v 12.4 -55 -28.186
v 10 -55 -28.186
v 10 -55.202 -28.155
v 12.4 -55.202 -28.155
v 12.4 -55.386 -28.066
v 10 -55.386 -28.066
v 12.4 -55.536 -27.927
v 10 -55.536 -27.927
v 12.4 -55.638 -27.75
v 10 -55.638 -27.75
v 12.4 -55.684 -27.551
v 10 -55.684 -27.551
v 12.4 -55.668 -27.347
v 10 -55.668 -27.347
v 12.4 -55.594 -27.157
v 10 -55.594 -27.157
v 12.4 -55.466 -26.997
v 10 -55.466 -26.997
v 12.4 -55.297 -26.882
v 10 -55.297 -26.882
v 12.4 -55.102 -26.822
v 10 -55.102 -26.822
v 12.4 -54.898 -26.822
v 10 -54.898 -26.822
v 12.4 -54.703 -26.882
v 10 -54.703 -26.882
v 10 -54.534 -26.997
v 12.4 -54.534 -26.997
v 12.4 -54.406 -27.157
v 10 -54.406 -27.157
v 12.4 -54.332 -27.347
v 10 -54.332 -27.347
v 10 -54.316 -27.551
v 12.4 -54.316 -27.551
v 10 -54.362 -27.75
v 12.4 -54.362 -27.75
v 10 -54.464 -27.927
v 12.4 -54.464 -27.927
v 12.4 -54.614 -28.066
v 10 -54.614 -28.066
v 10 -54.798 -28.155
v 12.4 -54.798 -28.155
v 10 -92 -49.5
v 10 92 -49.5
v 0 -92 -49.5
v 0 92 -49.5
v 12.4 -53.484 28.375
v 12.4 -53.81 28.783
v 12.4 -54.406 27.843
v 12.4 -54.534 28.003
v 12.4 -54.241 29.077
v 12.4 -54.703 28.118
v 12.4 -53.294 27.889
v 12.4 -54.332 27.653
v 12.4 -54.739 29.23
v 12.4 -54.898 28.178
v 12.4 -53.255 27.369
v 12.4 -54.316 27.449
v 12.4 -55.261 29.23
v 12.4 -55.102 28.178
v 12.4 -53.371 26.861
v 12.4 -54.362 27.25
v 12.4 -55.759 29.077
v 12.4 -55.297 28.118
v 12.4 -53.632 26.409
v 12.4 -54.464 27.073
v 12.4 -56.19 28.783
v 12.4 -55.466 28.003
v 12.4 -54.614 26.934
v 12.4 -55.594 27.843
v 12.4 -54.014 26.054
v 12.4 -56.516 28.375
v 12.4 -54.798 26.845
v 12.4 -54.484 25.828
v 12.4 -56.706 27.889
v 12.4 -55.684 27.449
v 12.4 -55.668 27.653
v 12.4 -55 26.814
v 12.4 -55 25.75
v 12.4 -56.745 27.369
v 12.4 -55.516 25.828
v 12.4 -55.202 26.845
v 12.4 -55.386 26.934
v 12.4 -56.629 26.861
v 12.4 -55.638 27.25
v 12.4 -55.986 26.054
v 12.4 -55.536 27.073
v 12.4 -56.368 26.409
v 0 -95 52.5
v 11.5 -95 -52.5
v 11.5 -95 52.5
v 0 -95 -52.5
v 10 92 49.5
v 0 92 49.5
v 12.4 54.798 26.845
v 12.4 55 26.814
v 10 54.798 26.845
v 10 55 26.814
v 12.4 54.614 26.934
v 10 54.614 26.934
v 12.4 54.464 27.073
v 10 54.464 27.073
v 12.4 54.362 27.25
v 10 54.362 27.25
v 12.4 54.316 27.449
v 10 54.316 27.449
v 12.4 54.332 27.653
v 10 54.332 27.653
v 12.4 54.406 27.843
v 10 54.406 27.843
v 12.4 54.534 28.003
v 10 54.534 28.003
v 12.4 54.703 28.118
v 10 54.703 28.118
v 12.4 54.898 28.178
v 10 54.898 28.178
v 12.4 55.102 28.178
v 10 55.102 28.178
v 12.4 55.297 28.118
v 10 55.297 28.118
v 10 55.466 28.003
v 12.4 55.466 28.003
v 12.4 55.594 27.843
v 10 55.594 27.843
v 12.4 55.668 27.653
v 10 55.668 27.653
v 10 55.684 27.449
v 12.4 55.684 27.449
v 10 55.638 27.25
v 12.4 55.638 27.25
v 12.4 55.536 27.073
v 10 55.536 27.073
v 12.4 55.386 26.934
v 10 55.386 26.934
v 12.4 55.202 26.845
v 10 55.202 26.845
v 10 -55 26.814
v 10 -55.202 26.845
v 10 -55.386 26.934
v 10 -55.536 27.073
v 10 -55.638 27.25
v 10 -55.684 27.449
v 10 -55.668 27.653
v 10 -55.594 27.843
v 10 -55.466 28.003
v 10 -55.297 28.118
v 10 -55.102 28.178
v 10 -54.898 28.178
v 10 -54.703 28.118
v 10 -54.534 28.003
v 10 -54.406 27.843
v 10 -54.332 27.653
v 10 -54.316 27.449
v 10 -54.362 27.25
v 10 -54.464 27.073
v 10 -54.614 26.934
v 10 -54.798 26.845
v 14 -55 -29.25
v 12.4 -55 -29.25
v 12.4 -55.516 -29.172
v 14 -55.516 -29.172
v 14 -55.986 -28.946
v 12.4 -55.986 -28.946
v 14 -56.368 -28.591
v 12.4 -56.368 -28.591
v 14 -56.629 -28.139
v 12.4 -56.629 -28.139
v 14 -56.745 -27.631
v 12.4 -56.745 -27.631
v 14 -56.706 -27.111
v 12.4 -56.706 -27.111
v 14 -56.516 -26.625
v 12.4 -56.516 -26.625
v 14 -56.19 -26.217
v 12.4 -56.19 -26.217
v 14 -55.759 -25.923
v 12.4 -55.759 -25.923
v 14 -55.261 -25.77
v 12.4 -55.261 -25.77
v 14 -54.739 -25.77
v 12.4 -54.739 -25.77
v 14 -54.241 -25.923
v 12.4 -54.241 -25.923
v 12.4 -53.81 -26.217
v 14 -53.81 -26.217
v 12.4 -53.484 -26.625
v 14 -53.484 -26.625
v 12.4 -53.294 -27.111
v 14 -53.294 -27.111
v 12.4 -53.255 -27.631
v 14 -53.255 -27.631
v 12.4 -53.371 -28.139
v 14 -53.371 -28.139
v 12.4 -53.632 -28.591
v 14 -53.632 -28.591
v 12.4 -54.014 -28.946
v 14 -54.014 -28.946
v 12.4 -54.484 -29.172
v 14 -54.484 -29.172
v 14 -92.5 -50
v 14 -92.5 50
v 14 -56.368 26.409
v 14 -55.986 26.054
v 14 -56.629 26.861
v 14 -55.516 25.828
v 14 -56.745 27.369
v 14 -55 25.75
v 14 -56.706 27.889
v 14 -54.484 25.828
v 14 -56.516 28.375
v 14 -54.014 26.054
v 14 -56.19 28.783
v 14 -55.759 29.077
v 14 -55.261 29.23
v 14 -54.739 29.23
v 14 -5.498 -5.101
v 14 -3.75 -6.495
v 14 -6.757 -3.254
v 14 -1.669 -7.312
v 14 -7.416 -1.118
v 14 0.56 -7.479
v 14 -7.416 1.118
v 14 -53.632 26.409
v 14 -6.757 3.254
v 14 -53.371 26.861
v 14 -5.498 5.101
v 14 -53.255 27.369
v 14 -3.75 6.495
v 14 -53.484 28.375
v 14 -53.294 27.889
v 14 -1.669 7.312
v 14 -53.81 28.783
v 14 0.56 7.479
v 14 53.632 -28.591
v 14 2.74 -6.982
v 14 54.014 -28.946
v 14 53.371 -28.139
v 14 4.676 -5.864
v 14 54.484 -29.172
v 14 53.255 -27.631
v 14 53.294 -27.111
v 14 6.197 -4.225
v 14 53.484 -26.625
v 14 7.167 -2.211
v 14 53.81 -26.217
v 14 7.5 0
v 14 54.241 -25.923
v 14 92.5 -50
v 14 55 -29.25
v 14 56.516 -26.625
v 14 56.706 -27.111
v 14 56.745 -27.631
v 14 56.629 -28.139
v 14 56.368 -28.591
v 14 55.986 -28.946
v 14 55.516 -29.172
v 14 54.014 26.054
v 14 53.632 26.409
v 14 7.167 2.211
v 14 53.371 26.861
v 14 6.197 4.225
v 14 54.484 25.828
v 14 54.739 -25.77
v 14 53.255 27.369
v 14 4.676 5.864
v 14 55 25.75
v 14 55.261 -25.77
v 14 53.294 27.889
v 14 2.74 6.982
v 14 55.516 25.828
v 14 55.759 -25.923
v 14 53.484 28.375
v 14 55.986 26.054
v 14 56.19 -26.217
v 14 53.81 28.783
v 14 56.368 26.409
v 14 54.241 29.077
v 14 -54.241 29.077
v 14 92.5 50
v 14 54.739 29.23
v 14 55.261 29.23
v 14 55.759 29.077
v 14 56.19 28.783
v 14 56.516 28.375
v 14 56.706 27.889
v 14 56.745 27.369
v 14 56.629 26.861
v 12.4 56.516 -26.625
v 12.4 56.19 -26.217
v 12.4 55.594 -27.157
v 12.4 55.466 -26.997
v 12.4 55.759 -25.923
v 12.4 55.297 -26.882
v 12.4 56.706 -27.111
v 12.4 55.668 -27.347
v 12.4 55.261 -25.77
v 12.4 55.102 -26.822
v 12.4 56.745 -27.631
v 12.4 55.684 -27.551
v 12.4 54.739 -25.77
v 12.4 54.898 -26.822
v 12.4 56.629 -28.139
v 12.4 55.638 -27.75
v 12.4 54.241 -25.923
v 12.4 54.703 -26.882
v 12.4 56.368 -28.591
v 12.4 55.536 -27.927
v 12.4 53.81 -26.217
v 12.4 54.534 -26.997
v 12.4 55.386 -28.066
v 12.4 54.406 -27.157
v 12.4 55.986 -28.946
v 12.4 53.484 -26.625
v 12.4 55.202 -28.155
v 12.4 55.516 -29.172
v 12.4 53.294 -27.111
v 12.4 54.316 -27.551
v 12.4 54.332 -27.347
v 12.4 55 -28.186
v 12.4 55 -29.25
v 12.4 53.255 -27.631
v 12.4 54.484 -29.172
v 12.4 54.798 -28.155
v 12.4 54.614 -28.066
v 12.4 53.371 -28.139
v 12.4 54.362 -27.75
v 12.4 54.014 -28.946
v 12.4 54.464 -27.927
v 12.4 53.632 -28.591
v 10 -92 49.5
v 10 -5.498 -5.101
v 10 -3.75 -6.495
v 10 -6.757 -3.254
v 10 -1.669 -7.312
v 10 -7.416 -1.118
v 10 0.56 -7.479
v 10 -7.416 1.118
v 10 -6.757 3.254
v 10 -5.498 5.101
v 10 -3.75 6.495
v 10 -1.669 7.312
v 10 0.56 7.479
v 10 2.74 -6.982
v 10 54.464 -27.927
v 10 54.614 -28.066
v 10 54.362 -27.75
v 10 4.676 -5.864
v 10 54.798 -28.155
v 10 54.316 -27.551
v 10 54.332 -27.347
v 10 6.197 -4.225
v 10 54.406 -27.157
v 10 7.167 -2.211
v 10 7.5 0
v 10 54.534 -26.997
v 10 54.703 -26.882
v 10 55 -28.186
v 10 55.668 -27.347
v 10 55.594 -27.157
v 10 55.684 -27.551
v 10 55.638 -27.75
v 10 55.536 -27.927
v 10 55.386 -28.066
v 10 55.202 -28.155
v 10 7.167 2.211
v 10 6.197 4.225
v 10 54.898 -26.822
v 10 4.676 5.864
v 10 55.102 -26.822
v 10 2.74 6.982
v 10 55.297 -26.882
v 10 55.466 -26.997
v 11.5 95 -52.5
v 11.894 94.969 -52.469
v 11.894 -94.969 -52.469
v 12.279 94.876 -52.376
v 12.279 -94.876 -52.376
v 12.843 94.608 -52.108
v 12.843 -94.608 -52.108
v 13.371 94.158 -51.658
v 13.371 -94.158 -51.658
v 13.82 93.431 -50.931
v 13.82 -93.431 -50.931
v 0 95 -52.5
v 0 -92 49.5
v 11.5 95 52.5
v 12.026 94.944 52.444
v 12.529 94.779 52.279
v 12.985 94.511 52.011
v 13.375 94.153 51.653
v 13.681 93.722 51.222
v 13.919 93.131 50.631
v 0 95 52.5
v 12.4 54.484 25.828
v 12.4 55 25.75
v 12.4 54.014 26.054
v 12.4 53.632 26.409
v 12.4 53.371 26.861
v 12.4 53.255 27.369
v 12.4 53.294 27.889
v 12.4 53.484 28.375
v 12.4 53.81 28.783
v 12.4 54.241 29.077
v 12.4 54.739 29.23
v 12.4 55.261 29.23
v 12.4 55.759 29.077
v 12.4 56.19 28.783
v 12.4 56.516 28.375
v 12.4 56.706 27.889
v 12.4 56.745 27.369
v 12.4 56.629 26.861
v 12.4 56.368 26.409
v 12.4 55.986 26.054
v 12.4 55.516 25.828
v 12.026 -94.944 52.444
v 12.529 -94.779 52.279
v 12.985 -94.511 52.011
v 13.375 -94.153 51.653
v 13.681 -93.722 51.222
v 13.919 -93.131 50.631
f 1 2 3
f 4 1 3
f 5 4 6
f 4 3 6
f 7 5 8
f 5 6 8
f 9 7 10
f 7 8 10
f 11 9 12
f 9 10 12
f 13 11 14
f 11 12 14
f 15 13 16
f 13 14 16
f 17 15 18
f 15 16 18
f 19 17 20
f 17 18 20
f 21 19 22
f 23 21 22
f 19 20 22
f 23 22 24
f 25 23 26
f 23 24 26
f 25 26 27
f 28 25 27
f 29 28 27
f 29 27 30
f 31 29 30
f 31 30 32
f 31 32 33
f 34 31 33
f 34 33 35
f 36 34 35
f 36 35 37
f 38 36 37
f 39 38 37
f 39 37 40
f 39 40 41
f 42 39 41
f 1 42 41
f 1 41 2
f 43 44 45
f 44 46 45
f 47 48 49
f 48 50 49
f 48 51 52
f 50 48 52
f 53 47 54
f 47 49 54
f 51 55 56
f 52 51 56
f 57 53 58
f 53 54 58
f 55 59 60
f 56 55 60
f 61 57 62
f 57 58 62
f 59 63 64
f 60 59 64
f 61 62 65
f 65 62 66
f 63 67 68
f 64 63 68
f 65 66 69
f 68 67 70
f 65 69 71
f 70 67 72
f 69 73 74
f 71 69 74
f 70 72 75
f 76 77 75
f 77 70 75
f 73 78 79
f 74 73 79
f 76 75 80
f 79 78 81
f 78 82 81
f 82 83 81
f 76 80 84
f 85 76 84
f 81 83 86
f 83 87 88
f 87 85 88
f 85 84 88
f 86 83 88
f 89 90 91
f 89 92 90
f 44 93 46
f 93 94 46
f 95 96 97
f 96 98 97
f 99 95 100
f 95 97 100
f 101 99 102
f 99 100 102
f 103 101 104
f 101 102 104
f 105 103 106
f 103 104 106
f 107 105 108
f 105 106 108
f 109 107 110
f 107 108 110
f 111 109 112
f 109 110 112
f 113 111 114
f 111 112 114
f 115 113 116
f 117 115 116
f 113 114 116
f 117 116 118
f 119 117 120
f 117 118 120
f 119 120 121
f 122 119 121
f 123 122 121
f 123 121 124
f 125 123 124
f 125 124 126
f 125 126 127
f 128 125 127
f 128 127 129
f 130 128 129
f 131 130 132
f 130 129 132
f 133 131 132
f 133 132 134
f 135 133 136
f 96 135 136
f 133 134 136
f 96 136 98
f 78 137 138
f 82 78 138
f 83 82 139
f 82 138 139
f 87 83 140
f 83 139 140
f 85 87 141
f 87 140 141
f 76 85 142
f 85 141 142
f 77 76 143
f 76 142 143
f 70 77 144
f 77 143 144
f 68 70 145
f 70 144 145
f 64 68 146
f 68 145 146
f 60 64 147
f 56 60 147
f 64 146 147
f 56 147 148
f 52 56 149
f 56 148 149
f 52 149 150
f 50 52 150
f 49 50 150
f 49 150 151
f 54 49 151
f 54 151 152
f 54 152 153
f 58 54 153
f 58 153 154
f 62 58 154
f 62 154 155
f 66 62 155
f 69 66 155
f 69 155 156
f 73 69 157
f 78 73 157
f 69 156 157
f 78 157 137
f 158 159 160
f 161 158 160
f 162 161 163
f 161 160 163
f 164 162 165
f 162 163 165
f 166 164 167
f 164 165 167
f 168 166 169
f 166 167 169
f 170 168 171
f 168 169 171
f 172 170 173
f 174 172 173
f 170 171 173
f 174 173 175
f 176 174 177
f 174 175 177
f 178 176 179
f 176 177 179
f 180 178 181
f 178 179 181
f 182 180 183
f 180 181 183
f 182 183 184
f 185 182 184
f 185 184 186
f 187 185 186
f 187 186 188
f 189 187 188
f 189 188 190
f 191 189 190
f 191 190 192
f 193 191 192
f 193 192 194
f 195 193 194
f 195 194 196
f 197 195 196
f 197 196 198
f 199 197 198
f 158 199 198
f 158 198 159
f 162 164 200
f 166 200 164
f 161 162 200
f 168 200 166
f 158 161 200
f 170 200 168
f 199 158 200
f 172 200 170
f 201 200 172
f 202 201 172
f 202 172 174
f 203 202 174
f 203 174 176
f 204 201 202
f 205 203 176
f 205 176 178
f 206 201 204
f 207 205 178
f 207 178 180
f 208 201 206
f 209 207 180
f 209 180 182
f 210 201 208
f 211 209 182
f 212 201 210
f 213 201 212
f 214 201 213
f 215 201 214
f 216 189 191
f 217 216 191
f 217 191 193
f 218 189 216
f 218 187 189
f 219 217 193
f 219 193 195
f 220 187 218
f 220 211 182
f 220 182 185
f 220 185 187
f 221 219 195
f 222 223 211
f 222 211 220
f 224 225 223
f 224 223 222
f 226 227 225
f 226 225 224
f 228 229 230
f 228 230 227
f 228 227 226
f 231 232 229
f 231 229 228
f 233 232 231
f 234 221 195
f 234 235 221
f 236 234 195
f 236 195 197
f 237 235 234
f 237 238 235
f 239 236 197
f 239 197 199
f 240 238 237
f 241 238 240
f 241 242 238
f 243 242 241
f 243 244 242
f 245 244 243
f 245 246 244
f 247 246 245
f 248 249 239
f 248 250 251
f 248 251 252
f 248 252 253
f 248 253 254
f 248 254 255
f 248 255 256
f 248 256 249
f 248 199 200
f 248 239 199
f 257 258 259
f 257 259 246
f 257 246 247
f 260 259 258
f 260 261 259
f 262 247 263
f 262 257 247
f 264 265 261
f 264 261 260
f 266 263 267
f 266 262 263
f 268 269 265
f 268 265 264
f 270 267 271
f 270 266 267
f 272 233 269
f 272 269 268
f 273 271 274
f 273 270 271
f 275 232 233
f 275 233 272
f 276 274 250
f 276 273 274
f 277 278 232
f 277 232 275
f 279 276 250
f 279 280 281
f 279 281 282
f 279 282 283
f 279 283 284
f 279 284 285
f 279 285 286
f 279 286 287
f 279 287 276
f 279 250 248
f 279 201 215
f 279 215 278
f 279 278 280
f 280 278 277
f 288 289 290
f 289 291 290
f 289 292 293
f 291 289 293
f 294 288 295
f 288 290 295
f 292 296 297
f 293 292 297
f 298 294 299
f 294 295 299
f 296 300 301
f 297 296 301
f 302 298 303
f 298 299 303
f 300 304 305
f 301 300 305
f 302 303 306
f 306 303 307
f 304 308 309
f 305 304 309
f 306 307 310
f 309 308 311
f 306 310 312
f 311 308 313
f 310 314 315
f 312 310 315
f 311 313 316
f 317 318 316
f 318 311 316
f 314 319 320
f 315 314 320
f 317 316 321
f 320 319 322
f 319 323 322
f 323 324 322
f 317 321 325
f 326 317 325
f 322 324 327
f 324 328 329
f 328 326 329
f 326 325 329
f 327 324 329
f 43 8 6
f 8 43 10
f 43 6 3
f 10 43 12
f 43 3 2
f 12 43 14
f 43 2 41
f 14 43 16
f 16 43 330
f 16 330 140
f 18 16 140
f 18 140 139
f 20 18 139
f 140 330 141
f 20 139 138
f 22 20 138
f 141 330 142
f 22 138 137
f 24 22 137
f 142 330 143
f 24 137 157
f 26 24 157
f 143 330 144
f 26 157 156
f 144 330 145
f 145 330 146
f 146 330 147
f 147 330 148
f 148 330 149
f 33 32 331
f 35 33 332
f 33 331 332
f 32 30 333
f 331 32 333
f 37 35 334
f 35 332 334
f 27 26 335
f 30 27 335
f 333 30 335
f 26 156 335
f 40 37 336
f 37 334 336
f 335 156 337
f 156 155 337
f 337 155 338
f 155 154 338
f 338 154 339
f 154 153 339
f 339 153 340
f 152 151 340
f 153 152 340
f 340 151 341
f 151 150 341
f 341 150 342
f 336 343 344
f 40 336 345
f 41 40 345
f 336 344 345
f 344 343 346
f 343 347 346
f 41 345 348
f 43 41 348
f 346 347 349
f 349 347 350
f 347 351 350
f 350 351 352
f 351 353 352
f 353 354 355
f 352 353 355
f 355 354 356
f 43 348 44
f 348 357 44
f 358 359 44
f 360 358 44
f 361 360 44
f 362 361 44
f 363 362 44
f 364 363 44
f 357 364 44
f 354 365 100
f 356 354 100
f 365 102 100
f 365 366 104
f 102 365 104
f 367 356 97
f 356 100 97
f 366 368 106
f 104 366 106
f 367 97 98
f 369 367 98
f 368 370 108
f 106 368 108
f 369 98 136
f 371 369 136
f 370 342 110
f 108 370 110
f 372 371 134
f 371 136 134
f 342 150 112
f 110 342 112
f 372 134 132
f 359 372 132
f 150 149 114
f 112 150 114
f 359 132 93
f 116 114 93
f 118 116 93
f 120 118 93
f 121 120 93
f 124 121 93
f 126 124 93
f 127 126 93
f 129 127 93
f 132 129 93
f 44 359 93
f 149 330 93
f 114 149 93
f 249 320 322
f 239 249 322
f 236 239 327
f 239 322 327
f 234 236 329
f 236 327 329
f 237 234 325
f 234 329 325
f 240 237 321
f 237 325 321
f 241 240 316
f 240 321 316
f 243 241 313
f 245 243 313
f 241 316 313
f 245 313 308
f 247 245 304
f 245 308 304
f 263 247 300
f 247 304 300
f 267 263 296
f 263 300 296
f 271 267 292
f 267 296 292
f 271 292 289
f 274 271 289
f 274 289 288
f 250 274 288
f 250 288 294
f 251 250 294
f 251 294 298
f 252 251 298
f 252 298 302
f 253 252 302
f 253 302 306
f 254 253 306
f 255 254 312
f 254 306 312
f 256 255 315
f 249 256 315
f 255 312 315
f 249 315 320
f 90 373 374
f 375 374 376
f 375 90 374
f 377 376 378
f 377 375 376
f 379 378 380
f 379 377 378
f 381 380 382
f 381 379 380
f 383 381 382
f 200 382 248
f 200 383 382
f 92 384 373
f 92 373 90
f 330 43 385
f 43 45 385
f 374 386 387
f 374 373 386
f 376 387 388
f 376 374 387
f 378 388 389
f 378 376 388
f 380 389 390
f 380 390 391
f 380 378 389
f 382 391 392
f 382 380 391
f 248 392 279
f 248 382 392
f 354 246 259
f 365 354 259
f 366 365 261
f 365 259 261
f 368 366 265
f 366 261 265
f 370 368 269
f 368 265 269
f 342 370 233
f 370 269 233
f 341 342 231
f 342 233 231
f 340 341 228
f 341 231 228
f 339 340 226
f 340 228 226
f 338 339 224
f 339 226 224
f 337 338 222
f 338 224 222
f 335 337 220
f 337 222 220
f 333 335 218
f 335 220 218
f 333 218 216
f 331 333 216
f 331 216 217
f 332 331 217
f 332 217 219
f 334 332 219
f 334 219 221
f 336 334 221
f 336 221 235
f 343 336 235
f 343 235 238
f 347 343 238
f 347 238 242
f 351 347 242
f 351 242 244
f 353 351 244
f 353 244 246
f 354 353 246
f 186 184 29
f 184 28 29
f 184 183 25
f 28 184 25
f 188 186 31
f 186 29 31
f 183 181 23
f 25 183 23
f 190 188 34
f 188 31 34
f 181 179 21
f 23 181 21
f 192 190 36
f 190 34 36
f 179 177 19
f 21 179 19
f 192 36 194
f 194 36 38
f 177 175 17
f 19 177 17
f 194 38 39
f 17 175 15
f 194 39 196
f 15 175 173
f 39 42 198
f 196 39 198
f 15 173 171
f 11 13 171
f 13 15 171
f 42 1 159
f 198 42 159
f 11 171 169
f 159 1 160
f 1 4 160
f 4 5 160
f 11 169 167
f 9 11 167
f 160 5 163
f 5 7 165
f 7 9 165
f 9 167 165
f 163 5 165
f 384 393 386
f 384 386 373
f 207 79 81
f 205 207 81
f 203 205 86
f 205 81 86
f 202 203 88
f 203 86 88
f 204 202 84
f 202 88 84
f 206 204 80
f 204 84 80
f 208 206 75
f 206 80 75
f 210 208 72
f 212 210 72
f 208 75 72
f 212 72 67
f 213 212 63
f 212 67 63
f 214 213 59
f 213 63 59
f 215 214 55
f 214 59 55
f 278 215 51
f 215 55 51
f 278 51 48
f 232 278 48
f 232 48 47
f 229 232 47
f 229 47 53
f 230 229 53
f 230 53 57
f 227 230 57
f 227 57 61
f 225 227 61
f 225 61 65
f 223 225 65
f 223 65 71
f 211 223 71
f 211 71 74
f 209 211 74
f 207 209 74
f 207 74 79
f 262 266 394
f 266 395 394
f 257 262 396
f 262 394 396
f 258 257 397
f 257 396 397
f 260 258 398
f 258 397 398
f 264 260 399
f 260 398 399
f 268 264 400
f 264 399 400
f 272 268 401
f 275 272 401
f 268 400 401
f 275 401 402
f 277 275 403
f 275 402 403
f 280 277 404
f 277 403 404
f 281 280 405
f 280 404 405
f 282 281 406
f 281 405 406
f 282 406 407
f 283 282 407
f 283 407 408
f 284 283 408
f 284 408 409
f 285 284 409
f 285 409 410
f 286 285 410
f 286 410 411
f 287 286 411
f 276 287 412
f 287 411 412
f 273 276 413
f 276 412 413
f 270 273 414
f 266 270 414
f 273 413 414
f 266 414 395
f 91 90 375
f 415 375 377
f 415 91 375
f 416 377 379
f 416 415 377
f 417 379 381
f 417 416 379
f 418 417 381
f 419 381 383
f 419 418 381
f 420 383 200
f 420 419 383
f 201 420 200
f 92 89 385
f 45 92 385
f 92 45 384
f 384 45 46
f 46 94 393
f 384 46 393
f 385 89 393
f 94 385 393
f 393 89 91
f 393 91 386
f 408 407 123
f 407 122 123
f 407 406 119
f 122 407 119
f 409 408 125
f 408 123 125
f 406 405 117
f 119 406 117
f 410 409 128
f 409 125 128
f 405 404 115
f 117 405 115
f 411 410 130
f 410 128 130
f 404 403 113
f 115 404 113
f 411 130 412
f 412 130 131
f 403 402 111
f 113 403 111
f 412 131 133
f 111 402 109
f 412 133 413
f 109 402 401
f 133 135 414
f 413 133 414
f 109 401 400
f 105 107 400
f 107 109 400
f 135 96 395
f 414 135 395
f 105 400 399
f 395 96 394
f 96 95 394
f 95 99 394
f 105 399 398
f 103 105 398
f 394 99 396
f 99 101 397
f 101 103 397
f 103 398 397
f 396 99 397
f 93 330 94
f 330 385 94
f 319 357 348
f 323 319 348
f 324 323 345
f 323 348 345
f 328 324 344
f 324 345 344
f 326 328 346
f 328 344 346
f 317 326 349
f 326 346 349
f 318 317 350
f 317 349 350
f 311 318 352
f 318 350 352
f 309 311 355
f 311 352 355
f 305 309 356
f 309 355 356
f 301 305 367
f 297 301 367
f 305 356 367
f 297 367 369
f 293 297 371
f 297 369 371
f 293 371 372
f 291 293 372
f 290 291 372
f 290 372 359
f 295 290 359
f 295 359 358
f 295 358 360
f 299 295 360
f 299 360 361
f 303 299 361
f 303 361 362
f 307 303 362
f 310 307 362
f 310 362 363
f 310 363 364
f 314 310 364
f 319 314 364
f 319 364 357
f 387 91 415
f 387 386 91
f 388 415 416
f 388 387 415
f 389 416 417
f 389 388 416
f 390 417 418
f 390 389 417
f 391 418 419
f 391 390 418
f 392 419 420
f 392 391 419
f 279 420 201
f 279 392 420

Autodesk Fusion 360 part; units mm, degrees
sketch "Sketch1" plane through (0, 0, 0) normal (1, 0, 0) x (0, 1, 0)
  line L0 (-95, 52.5) -> (95, 52.5)
  line L1 (95, 52.5) -> (95, -52.5)
  line L2 (95, -52.5) -> (-95, -52.5)
  line L3 (-95, -52.5) -> (-95, 52.5)
  line L4 (95, 52.5) -> (-95, -52.5) construction
  line L5 (-95, 52.5) -> (95, -52.5) construction
  line L6 (92, -49.5) -> (-92, -49.5)
  line L7 (-92, -49.5) -> (-92, 49.5)
  line L8 (-92, 49.5) -> (92, 49.5)
  line L9 (92, 49.5) -> (92, -49.5)
  dimension "d1" = 190
  dimension "d2" = 105
  dimension "d5" = 3
extrude "Extrude1" add sketch "Sketch1" along normal blind 14 contours L0 L1 L2 L3 | L6 L7 L8 L9
extrude "Extrude2" cut sketch "Sketch1" along normal blind 10 contours L6 L7 L8 L9
fillet "Fillet1" radius 2.5 4 edges at (14, 0, -52.5) (14, 95, 0) (14, 0, 52.5) (14, -95, 0)
sketch "Sketch2" plane through (14, 0, 0) normal (1, 0, 0) x (0, 1, 0)
  line L0 (92.5, 50) -> (-92.5, 50)
  line L1 (-92.5, 50) -> (-92.5, -50)
  line L2 (-92.5, -50) -> (92.5, -50)
  line L3 (92.5, -50) -> (92.5, 50)
  circle A0 centre (0, 0) radius 7.5
  dimension "d10" = 15
extrude "Extrude3" cut sketch "Sketch2" against normal blind 40 contours A0
sketch "Sketch3" plane through (14, 0, 0) normal (1, 0, 0) x (0, 1, 0)
  circle A0 centre (0, 0) radius 7.5
  line L0 (92.5, 50) -> (-92.5, 50)
  line L1 (-92.5, 50) -> (-92.5, -50)
  line L2 (-92.5, -50) -> (92.5, -50)
  line L3 (92.5, -50) -> (92.5, 50)
  line L4 (-55, 27.5) -> (55, 27.5)
  line L5 (55, 27.5) -> (55, -27.5)
  line L6 (55, -27.5) -> (-55, -27.5)
  line L7 (-55, -27.5) -> (-55, 27.5)
  line L8 (55, 27.5) -> (-55, -27.5) construction
  line L9 (-55, 27.5) -> (55, -27.5) construction
  dimension "d13" = 110
  dimension "d14" = 55
hole "Hole1" at (14, 55, 27.5) at (14, -55, 27.5) at (14, -55, -27.5) at (14, 55, -27.5) direction (-1, 0, 0) diameter 1.371 depth 10 tip angle 118 counterbore diameter 3.5 counterbore depth 1.6
